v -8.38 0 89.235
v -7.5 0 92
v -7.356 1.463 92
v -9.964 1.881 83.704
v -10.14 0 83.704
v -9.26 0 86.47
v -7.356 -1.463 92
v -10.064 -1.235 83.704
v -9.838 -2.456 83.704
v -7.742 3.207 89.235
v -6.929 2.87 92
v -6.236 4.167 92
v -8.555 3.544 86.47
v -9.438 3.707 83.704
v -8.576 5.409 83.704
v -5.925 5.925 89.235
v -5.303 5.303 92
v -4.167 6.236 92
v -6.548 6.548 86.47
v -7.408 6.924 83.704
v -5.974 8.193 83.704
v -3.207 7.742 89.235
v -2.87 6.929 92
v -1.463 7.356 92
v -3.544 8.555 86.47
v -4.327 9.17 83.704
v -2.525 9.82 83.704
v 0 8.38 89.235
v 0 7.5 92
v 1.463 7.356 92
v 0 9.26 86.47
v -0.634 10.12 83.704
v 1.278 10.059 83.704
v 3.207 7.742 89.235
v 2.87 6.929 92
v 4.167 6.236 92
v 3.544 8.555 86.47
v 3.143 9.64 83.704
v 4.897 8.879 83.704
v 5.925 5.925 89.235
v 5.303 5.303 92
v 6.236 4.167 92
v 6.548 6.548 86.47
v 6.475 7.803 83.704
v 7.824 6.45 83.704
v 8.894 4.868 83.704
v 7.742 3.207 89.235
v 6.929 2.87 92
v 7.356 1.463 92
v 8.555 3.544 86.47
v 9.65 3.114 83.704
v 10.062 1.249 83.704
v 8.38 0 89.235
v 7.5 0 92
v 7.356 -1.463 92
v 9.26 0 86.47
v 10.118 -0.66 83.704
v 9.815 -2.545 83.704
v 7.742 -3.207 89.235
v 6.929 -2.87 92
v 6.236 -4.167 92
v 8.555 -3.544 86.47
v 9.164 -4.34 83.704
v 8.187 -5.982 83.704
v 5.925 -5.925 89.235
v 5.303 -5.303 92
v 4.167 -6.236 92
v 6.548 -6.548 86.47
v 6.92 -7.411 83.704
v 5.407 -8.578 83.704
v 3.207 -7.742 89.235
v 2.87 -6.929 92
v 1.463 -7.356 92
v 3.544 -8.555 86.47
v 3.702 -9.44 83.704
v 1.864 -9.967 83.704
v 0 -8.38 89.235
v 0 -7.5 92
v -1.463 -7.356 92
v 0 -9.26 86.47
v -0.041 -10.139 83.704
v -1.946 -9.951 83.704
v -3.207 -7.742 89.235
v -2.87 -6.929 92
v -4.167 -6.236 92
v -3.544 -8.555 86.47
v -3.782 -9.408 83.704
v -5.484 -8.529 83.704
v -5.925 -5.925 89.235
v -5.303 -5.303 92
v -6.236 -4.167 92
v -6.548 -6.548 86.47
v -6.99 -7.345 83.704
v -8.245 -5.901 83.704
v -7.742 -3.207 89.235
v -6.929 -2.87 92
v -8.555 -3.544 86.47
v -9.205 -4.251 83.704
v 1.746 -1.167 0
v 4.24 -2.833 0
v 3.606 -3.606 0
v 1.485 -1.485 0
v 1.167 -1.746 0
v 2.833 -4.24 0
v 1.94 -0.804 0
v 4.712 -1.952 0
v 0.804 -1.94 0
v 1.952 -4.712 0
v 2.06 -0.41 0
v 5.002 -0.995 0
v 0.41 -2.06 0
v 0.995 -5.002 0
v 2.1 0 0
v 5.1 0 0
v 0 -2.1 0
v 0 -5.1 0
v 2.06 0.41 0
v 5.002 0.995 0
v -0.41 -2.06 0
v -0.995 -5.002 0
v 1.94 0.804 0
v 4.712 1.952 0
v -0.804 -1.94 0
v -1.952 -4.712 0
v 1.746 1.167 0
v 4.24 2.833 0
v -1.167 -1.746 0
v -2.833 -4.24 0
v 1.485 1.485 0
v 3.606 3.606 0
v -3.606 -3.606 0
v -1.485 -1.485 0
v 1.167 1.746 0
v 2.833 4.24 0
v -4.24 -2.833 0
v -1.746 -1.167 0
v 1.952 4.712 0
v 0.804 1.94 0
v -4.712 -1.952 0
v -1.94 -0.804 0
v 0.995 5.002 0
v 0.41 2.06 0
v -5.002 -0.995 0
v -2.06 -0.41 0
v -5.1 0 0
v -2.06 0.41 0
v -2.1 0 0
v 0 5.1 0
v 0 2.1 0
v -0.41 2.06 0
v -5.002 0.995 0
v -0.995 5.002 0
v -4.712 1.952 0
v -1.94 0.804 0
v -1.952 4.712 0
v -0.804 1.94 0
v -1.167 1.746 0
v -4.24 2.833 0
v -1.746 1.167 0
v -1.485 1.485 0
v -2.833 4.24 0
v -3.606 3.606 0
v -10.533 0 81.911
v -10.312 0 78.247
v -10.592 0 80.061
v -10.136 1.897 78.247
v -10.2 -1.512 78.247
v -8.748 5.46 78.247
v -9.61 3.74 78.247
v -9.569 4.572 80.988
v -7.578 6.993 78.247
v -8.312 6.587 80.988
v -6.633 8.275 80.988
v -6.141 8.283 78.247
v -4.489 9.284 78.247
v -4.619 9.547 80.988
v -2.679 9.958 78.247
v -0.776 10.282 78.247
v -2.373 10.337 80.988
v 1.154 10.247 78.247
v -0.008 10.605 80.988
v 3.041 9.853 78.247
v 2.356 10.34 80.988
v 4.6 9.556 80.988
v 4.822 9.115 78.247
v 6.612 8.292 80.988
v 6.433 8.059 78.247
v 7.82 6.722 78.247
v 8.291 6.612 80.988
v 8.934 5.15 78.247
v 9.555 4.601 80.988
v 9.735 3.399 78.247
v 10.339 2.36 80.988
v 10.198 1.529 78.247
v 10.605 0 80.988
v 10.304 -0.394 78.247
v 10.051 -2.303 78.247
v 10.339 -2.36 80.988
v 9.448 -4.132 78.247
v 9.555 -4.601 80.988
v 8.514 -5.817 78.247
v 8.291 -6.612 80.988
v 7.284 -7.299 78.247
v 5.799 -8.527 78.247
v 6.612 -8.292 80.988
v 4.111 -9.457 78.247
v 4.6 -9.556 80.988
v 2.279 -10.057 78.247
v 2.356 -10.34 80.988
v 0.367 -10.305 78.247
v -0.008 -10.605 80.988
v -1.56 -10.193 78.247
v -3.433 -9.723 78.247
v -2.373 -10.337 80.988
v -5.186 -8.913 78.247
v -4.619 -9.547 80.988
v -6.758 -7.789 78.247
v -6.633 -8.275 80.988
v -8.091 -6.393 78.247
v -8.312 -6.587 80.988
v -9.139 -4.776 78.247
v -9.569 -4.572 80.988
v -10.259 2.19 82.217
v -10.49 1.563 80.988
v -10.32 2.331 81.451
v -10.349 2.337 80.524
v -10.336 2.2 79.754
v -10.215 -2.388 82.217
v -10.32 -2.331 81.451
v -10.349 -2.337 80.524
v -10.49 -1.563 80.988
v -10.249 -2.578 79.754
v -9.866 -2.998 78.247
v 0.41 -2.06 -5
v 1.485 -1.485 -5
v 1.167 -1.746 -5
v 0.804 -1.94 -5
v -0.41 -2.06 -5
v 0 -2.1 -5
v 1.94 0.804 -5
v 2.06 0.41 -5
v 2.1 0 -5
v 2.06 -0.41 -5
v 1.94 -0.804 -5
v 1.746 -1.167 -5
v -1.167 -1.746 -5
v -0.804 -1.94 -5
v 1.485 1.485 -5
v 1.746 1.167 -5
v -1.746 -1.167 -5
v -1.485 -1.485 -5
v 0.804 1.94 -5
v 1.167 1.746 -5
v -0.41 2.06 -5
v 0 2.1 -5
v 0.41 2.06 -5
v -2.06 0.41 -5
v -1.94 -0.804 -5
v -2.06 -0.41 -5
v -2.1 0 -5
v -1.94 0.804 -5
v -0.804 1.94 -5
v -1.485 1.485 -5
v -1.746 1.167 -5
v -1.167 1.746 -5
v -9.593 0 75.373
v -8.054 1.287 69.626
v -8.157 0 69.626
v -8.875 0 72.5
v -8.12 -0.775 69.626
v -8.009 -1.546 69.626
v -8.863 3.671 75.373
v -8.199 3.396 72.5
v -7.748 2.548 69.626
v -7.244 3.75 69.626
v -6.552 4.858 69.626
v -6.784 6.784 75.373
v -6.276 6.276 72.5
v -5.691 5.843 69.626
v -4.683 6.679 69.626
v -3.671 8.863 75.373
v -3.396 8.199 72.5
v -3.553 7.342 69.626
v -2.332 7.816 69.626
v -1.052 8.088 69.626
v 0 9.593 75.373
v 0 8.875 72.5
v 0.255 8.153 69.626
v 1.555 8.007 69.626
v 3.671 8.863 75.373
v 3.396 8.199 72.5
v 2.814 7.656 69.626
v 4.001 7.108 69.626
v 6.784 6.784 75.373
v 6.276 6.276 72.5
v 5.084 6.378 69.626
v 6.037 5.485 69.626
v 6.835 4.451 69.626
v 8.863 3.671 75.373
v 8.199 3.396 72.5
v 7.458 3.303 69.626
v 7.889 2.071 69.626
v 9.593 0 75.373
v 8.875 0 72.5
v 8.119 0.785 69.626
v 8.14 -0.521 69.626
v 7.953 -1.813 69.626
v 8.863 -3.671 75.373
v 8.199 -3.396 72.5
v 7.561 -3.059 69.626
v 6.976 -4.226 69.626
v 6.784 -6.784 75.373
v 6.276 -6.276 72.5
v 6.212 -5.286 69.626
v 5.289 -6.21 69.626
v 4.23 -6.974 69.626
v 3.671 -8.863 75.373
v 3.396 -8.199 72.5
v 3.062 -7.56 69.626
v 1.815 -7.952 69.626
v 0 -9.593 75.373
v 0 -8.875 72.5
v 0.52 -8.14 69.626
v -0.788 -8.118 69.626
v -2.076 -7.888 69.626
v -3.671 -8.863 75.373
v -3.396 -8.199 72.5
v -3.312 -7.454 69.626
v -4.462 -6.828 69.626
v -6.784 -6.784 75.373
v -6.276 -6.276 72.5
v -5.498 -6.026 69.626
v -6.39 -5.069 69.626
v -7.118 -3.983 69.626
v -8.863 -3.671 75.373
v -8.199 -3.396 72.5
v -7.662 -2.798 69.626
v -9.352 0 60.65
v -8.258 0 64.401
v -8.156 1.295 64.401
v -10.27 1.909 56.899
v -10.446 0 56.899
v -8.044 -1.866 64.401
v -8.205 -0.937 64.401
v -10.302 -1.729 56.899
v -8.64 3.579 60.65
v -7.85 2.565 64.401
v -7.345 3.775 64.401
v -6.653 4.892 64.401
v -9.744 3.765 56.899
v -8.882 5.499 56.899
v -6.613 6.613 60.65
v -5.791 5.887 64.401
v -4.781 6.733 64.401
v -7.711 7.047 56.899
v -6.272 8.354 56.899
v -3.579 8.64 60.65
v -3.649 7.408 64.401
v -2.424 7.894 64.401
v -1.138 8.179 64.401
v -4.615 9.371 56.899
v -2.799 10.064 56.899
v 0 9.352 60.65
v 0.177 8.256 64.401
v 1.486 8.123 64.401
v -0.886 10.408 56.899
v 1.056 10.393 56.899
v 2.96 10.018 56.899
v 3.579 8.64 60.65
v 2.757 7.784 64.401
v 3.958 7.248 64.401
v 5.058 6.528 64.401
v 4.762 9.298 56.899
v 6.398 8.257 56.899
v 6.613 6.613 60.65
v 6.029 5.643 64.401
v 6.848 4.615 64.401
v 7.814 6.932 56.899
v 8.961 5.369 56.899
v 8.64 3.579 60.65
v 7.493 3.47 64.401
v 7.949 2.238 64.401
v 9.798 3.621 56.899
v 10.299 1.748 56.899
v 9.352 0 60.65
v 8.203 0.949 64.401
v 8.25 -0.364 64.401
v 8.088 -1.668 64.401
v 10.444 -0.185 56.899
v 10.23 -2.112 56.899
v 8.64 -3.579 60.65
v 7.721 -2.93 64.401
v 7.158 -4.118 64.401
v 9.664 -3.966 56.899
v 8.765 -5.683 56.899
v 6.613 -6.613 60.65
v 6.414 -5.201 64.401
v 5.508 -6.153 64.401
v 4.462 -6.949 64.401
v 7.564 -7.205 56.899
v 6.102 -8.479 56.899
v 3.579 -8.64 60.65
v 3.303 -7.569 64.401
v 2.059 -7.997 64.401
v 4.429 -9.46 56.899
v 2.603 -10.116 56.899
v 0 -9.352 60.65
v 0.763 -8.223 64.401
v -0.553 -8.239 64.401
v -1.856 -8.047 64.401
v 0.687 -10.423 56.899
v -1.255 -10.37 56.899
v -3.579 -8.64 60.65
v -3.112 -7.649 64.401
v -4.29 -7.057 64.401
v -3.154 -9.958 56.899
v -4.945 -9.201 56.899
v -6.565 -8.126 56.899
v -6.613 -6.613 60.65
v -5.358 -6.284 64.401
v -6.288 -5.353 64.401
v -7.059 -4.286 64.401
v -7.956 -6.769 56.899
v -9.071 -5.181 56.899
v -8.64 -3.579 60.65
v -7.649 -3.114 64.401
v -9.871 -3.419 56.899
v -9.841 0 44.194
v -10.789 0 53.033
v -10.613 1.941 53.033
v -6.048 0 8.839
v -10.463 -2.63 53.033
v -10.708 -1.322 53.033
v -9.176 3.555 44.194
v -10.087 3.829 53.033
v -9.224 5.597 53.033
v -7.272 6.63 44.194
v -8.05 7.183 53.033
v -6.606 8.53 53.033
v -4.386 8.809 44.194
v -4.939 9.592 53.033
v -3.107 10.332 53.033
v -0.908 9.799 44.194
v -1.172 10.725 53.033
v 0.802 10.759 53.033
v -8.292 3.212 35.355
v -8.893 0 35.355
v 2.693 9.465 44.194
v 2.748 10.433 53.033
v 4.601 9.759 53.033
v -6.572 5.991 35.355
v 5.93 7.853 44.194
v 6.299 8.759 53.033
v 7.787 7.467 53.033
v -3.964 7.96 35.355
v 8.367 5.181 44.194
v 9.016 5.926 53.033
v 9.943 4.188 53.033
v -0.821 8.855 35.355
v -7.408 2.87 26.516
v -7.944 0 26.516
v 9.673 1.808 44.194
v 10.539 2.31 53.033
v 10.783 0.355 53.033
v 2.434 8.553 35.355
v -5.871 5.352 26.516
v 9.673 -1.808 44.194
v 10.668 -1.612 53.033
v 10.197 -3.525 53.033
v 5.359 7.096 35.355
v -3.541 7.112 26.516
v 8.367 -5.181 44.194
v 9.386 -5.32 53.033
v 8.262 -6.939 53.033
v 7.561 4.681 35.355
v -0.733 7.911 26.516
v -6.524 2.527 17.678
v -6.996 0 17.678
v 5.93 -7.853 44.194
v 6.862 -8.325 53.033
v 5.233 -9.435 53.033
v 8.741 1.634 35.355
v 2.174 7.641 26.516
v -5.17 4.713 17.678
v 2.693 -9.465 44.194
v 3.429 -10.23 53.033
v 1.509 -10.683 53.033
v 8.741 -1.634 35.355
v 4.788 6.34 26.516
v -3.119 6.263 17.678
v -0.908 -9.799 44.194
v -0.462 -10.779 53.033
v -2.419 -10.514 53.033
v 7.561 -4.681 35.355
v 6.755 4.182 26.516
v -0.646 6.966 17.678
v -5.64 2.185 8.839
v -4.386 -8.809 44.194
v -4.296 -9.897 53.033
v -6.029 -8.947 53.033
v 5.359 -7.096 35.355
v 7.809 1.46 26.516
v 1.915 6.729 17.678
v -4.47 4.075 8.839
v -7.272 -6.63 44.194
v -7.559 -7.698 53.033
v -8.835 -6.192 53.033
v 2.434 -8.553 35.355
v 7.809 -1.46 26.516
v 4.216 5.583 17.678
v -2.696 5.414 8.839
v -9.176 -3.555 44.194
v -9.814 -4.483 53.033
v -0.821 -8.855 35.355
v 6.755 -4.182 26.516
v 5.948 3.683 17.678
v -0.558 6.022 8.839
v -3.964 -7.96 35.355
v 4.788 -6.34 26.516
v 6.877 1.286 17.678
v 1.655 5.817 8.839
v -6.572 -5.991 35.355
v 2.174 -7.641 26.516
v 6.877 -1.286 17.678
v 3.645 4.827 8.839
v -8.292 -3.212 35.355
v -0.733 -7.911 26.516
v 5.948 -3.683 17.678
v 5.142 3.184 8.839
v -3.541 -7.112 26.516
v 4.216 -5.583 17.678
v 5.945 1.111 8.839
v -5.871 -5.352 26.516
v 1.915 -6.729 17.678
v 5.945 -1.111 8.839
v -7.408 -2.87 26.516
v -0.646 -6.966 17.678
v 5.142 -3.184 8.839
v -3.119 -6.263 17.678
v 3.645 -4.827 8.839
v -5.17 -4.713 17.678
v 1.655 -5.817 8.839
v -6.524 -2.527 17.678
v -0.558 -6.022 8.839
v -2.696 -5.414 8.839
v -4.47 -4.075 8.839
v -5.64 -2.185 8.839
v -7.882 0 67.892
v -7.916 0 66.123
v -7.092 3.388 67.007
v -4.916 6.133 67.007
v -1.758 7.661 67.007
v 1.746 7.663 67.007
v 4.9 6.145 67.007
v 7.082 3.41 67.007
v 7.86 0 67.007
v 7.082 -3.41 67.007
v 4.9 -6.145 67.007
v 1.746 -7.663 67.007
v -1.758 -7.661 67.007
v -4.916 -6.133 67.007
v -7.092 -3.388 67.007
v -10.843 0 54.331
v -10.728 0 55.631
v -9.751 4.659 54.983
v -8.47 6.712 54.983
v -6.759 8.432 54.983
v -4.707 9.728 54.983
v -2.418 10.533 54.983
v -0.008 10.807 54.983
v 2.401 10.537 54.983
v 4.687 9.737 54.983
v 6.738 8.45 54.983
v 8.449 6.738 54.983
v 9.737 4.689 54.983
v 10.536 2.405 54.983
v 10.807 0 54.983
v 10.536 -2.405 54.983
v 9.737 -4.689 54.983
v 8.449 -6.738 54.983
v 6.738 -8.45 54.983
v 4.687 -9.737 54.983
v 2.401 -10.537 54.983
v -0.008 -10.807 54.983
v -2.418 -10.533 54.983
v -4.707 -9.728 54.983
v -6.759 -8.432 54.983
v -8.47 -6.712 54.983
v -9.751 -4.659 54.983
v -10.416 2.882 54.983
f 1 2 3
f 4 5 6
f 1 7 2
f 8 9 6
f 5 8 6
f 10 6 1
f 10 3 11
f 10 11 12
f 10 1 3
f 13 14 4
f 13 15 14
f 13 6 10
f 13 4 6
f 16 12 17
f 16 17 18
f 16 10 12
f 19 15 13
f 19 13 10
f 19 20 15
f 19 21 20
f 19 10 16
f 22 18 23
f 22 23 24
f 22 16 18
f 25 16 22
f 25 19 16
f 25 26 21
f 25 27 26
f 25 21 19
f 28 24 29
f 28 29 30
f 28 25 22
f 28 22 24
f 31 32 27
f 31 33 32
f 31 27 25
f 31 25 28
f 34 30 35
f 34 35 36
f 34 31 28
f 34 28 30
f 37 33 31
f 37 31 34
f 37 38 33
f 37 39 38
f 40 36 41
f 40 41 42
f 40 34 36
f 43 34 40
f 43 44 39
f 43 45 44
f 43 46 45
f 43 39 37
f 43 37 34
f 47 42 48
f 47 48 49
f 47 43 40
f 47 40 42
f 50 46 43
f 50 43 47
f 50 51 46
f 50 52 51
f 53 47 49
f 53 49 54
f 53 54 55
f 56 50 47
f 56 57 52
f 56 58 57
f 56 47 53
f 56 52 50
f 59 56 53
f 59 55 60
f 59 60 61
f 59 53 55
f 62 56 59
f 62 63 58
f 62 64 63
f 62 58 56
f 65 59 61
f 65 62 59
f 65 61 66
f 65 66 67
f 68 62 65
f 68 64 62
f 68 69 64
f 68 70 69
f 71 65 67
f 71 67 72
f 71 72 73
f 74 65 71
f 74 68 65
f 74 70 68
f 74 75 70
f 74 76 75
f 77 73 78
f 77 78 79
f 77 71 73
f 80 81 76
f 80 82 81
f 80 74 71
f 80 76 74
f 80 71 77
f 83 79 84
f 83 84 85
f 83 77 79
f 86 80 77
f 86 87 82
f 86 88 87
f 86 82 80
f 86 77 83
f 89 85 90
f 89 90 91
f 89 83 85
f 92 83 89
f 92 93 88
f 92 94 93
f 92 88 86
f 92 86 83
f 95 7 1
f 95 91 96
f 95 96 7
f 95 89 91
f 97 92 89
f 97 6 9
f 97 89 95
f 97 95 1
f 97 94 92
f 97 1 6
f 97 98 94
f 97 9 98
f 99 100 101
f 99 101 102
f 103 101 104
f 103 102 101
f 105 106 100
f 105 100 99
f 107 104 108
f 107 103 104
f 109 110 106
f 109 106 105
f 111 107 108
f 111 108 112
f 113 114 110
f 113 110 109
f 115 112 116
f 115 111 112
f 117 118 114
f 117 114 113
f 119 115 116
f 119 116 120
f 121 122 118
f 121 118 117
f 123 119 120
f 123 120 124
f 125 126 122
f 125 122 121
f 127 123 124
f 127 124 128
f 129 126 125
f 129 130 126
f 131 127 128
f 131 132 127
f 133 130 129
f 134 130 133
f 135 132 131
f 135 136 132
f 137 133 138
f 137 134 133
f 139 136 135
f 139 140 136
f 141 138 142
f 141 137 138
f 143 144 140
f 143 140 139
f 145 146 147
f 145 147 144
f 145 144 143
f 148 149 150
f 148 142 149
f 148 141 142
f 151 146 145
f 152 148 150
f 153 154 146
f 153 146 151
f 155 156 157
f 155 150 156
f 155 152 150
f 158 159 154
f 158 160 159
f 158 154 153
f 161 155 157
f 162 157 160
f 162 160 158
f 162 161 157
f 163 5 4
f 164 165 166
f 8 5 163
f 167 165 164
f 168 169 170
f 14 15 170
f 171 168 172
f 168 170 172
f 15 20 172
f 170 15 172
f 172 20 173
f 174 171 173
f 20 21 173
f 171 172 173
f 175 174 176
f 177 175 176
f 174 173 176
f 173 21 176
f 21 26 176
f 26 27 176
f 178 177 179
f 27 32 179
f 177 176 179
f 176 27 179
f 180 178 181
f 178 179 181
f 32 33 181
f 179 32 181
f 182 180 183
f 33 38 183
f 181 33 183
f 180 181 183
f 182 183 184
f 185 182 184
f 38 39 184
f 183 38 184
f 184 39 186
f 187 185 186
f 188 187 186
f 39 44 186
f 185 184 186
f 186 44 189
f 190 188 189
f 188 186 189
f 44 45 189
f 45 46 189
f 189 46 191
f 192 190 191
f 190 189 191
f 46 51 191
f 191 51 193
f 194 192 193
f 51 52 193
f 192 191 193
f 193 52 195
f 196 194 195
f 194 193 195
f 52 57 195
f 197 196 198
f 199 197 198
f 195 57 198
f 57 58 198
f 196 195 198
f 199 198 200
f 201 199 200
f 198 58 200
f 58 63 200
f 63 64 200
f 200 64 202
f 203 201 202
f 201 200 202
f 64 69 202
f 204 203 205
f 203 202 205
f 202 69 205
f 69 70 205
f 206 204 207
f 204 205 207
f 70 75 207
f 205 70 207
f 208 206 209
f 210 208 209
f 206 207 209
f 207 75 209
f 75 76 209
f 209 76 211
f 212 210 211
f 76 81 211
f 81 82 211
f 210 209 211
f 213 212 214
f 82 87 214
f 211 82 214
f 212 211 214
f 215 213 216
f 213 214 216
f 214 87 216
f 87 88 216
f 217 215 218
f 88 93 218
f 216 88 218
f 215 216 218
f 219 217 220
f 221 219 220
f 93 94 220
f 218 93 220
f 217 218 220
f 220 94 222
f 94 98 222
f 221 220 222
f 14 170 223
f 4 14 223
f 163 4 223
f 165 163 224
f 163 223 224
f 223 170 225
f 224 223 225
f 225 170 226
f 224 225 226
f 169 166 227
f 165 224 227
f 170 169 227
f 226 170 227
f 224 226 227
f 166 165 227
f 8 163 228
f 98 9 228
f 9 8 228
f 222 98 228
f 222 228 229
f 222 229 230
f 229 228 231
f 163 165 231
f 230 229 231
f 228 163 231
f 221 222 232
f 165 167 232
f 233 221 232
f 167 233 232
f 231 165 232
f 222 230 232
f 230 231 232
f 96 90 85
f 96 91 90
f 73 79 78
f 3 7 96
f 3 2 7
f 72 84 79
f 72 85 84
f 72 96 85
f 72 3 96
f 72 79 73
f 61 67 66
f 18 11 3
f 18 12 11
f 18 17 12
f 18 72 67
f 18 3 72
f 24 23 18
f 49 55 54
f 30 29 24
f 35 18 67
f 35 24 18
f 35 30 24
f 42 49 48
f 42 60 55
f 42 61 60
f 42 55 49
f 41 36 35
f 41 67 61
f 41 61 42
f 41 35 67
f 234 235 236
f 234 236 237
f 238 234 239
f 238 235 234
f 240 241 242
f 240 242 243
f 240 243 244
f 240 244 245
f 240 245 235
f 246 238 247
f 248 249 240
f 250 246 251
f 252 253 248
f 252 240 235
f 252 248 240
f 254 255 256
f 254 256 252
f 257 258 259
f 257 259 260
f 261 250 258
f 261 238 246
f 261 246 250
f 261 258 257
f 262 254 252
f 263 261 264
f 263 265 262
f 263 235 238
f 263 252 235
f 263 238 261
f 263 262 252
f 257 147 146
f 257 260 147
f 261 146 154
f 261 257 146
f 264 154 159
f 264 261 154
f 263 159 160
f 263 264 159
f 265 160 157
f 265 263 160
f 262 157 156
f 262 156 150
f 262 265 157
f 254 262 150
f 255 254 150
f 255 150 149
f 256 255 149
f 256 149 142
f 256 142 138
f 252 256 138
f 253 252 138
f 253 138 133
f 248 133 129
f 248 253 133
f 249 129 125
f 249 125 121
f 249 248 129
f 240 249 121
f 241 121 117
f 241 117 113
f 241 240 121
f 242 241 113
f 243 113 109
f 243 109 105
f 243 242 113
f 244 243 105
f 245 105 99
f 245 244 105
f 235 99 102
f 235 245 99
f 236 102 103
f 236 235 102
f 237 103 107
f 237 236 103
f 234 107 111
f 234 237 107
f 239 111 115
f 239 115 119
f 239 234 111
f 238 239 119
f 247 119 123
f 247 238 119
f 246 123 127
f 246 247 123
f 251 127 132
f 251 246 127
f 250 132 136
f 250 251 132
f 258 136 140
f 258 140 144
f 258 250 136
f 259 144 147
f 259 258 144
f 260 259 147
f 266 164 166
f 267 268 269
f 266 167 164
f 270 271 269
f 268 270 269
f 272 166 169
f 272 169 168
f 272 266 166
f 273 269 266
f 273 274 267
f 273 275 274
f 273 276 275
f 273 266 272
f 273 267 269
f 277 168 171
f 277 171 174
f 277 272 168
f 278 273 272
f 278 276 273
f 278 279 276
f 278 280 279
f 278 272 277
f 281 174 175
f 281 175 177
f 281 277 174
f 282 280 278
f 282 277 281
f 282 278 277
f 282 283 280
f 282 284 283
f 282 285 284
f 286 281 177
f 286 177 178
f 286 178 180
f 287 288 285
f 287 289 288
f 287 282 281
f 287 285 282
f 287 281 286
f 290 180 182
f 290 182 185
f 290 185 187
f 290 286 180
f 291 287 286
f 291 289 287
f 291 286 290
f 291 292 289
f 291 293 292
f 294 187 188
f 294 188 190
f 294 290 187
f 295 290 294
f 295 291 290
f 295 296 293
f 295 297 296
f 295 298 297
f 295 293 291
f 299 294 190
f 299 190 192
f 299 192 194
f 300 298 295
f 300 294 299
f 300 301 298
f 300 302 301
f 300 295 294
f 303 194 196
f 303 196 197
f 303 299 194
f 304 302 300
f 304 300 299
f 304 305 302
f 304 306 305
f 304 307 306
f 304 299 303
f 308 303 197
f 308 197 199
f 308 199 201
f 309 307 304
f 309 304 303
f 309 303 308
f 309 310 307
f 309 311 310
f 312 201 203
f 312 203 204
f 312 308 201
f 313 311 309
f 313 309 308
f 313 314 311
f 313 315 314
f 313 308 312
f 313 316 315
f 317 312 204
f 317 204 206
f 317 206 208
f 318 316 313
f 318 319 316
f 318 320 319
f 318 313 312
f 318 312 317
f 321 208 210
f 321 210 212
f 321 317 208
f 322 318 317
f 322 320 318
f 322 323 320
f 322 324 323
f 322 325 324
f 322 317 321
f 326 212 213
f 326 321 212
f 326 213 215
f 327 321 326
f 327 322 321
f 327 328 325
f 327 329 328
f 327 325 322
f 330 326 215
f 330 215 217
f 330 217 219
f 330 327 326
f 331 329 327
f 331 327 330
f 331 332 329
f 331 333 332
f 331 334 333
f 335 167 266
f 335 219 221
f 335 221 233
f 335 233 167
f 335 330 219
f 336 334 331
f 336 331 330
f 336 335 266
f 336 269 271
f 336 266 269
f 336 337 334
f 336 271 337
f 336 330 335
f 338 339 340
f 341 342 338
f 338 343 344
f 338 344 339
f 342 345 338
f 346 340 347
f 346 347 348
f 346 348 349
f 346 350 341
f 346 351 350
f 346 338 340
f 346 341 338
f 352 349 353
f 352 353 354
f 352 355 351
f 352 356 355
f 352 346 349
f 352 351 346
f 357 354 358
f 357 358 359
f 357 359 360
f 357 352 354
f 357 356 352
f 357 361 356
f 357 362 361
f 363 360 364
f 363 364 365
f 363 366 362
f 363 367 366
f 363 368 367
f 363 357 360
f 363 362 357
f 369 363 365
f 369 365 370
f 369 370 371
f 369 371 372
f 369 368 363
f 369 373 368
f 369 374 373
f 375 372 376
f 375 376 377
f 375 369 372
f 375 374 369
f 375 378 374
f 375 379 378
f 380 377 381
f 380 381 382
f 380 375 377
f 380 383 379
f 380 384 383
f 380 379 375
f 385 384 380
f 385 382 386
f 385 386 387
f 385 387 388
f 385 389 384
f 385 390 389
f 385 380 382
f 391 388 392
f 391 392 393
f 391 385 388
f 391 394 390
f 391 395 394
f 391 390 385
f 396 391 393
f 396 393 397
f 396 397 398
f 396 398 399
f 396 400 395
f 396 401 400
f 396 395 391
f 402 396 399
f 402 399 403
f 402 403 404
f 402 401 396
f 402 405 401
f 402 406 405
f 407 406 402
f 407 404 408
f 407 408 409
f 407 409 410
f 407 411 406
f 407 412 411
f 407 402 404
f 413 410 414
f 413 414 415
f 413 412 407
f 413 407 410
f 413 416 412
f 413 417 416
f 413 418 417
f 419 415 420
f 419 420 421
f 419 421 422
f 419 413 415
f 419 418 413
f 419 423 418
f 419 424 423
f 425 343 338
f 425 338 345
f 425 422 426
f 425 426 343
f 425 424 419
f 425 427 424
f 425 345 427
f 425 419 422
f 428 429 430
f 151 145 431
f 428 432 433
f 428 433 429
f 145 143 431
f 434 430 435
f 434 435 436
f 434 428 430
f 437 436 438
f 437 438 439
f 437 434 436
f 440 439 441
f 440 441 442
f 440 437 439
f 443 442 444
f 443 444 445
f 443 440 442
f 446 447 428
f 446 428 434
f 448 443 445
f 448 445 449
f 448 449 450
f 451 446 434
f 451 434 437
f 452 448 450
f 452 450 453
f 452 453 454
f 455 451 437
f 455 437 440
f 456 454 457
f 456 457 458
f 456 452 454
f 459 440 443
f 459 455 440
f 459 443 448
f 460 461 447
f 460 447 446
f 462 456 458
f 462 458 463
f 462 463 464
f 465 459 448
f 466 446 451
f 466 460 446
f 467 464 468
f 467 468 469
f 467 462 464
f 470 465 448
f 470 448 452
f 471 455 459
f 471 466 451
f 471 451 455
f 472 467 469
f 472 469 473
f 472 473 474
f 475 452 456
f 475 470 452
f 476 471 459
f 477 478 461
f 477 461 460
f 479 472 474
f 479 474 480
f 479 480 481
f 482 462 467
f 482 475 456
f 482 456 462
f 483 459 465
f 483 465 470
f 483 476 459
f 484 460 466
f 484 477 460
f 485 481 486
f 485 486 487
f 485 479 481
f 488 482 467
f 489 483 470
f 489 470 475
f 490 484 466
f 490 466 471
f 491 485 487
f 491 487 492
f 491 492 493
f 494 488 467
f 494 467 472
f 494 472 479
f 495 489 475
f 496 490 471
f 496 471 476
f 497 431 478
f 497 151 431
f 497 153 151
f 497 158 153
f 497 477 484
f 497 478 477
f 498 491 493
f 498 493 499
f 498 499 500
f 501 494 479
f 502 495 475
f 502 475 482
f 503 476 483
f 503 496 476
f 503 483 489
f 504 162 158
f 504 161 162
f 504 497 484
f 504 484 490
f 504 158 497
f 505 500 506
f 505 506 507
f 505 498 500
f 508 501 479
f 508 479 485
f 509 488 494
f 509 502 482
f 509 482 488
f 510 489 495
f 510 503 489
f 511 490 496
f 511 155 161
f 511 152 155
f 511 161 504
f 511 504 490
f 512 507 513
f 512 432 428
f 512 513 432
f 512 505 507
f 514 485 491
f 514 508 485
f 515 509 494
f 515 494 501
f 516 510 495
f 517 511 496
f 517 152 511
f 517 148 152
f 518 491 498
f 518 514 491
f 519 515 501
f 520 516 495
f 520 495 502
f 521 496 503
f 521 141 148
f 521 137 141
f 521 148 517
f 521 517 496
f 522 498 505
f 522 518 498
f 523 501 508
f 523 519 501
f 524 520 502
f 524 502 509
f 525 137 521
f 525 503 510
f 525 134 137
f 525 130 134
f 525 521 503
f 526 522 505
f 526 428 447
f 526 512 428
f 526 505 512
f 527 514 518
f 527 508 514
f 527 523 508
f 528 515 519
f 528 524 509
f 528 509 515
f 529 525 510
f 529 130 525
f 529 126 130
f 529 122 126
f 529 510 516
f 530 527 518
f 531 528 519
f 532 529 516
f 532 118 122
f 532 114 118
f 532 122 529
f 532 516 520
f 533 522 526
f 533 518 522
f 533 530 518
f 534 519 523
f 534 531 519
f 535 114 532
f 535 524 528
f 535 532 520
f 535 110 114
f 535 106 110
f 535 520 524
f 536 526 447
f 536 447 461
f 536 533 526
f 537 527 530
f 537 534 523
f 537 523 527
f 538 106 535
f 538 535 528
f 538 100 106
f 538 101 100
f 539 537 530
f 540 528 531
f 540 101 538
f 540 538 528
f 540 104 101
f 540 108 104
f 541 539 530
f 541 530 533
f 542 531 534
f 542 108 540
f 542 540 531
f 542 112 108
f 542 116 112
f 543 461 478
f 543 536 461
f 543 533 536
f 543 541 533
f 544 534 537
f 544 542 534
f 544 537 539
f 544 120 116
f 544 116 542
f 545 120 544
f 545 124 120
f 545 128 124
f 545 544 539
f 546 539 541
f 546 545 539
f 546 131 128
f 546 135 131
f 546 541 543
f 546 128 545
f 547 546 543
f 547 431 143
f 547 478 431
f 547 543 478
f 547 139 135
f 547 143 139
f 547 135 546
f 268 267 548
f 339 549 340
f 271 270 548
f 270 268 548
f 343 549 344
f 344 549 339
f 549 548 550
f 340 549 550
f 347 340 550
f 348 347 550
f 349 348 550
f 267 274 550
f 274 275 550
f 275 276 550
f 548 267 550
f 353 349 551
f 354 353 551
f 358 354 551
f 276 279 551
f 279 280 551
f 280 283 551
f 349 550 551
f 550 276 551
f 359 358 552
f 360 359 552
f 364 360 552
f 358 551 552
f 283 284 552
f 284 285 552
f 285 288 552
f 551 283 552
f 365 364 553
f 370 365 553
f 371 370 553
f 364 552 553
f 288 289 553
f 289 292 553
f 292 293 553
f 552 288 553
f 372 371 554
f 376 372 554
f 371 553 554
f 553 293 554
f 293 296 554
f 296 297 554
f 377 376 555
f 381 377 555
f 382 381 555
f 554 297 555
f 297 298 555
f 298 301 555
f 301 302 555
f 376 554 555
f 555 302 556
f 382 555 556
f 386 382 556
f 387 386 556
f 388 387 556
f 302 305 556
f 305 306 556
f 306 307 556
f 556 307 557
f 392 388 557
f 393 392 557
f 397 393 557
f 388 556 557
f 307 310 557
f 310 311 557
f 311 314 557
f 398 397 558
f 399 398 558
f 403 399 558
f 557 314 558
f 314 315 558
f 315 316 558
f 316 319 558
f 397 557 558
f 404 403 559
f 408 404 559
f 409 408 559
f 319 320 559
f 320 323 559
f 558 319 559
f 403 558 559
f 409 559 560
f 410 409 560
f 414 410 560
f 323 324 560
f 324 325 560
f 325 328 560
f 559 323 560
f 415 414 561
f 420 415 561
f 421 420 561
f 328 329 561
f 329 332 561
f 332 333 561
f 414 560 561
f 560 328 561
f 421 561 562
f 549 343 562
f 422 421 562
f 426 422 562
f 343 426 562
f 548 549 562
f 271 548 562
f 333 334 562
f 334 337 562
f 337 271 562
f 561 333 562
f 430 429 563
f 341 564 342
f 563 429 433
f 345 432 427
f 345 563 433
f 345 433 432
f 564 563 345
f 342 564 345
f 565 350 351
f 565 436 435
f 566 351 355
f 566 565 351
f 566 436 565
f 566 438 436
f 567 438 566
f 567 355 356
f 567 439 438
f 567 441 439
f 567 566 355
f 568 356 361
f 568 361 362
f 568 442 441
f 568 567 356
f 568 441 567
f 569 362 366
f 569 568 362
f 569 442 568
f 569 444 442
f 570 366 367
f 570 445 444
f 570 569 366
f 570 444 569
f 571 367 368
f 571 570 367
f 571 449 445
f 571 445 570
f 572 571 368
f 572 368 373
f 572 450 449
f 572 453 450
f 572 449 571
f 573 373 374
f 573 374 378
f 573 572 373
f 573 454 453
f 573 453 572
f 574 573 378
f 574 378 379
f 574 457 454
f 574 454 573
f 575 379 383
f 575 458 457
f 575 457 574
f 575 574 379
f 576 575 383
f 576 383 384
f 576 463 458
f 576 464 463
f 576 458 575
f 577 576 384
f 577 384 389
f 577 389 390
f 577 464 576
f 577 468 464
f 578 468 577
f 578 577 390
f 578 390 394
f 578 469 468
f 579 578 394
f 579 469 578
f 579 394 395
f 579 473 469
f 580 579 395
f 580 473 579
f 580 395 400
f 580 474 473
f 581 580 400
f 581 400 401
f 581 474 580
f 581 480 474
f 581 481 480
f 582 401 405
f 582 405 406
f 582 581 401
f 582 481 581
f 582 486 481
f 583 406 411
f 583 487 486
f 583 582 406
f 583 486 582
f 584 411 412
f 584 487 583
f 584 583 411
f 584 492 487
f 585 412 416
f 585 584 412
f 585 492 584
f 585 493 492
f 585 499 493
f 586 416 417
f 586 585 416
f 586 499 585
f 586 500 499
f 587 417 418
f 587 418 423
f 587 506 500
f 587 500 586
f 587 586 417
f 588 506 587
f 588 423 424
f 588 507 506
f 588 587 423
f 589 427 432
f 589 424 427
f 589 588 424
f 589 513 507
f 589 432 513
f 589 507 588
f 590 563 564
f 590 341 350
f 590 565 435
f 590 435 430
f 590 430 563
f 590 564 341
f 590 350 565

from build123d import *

# Parameters (mm, degrees)
F2_R = 10


with BuildPart() as f1:
    # F0 (on Front) → F1 (revolve)
    with BuildSketch(Plane.XZ):
        Polygon((-11, 55), (-5.1, 0), (-2.1, 0), (-2.1, -5), (0, -5), (0, 92), (-7.5, 92), (-11, 81), (-7.5, 67), align=None)
    revolve(axis=Axis((0, 0, 43.5), (0, 0, -1)))

    # F2
    f2_edges = [f1.edges().sort_by_distance(p)[0] for p in [
        (11, 0, 55),
        (7.5, 0, 67),
        (11, 0, 81),
    ]]
    fillet(f2_edges, radius=F2_R)


solid = f1.part
